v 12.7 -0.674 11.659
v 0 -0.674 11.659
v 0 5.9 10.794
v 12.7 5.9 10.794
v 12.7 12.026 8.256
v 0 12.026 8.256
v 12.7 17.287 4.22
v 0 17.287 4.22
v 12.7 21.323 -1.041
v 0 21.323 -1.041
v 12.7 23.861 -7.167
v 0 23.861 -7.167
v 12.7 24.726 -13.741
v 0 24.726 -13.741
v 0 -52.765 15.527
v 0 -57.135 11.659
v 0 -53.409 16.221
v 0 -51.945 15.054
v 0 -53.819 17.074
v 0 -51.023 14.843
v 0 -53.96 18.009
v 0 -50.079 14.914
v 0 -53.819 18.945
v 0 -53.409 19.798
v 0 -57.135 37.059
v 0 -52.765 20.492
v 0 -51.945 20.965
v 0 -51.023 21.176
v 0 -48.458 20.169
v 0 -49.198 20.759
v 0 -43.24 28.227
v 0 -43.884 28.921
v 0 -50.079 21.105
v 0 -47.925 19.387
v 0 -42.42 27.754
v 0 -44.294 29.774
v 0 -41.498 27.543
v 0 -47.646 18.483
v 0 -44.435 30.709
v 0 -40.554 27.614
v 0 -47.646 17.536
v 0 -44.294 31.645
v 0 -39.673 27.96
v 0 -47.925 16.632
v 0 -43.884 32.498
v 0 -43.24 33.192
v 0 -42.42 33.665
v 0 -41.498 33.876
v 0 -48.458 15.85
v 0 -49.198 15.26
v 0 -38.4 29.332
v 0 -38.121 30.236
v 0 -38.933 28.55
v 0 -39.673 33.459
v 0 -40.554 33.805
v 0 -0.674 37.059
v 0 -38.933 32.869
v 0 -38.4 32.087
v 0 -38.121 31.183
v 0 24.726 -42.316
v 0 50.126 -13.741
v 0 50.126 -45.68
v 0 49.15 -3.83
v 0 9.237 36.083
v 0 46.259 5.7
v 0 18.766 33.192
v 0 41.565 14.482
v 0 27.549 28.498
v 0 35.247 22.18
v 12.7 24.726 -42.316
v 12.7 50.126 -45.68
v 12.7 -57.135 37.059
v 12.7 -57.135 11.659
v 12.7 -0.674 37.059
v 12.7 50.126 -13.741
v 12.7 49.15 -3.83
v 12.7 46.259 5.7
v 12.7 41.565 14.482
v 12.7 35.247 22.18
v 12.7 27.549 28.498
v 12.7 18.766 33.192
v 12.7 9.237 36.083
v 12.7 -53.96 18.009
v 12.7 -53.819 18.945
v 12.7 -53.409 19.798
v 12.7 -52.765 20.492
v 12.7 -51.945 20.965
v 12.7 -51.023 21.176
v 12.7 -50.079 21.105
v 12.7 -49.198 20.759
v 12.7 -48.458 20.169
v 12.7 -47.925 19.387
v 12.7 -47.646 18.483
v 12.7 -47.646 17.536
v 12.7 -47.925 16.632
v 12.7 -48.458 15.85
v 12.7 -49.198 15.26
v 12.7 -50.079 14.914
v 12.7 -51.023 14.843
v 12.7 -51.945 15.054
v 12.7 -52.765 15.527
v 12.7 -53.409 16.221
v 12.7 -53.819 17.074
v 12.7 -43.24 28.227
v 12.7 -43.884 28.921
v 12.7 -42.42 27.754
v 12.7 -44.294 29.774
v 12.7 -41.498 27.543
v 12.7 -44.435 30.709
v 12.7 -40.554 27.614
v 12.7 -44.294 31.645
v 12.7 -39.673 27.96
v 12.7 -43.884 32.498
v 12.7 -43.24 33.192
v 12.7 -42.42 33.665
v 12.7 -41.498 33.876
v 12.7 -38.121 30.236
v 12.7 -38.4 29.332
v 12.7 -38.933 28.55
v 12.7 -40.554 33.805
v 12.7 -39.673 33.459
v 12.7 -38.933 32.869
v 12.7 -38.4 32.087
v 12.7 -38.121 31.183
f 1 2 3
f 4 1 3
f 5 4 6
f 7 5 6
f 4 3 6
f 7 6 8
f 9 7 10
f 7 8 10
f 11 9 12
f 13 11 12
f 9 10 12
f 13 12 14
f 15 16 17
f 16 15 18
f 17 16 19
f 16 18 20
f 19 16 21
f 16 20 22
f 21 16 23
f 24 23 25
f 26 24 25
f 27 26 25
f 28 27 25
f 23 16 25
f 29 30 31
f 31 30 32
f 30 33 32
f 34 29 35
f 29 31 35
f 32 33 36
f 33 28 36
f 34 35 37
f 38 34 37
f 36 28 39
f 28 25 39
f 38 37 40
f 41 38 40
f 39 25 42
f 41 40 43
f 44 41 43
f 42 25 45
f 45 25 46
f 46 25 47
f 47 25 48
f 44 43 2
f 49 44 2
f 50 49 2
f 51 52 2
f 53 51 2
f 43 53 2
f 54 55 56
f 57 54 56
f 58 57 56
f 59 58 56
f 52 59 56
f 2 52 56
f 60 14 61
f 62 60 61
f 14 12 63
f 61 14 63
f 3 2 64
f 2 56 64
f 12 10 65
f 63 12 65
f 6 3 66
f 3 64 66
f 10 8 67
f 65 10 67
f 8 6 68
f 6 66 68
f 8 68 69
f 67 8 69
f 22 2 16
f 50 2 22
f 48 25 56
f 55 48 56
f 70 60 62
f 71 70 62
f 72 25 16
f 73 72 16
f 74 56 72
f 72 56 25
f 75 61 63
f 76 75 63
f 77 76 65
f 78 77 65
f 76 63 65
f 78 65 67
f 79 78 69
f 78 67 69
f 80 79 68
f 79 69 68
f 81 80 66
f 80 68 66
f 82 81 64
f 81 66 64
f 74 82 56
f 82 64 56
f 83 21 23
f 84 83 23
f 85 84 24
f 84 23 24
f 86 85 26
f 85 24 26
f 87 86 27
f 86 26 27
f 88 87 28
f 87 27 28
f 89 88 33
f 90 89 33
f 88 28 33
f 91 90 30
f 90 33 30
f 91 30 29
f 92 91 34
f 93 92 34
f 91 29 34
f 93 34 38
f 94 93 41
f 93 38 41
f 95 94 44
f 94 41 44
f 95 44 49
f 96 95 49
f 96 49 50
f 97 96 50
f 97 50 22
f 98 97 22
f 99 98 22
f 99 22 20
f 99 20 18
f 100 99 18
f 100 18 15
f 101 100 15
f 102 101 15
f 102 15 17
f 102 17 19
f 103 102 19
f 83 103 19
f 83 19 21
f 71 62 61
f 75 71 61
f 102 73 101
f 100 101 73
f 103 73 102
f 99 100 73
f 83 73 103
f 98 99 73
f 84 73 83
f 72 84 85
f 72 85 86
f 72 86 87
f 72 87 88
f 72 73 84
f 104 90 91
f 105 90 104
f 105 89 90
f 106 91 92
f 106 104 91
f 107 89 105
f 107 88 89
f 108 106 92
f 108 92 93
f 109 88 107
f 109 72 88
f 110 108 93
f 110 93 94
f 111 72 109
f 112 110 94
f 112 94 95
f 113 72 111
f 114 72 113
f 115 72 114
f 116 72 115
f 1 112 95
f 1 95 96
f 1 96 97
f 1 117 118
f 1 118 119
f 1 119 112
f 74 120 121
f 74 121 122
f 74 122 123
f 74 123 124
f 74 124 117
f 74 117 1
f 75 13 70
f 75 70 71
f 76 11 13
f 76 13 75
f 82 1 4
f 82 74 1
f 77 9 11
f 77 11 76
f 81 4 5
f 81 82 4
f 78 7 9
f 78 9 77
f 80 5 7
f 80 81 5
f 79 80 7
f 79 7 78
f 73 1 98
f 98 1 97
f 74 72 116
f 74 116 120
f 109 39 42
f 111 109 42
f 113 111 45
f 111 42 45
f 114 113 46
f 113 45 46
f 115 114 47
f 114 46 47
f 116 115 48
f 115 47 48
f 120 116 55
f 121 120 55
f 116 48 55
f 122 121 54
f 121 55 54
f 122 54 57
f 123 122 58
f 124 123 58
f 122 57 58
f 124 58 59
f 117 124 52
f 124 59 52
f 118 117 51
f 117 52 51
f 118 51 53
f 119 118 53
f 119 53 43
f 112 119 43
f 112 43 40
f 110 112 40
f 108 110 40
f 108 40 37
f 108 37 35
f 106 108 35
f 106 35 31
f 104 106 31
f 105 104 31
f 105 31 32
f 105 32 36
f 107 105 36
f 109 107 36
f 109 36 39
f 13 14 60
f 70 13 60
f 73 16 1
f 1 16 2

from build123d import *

# Parameters (mm, degrees)
F1_DEPTH = 12.7
F3_D     = 6.35


with BuildPart() as f1:
    # F0 (on Right) → F1 (new body)
    with BuildSketch(Plane.YZ):
        with BuildLine():
            Line((-57.135387, 37.059388), (-57.135387, 11.659388))
            Line((-57.135387, 11.659388), (-0.673995, 11.659388))
            ThreePointArc((-0.673995, 11.659388), (17.286517, 4.219901), (24.726005, -13.740612))
            Line((24.726005, -13.740612), (24.726005, -42.315612))
            Line((24.726005, -42.315612), (50.126005, -45.680172))
            Line((50.126005, -45.680172), (50.126005, -13.740612))
            ThreePointArc((50.126005, -13.740612), (35.247029, 22.180413), (-0.673995, 37.059388))
            Line((-0.673995, 37.059388), (-57.135387, 37.059388))
        make_face()
    extrude(amount=F1_DEPTH)

    # F3 (through all)
    with Locations(Plane.YZ.offset(12.7)):
        with Locations((-50.785387, 18.009388), (-41.260387, 30.709388)):
            Hole(F3_D / 2)


solid = f1.part
